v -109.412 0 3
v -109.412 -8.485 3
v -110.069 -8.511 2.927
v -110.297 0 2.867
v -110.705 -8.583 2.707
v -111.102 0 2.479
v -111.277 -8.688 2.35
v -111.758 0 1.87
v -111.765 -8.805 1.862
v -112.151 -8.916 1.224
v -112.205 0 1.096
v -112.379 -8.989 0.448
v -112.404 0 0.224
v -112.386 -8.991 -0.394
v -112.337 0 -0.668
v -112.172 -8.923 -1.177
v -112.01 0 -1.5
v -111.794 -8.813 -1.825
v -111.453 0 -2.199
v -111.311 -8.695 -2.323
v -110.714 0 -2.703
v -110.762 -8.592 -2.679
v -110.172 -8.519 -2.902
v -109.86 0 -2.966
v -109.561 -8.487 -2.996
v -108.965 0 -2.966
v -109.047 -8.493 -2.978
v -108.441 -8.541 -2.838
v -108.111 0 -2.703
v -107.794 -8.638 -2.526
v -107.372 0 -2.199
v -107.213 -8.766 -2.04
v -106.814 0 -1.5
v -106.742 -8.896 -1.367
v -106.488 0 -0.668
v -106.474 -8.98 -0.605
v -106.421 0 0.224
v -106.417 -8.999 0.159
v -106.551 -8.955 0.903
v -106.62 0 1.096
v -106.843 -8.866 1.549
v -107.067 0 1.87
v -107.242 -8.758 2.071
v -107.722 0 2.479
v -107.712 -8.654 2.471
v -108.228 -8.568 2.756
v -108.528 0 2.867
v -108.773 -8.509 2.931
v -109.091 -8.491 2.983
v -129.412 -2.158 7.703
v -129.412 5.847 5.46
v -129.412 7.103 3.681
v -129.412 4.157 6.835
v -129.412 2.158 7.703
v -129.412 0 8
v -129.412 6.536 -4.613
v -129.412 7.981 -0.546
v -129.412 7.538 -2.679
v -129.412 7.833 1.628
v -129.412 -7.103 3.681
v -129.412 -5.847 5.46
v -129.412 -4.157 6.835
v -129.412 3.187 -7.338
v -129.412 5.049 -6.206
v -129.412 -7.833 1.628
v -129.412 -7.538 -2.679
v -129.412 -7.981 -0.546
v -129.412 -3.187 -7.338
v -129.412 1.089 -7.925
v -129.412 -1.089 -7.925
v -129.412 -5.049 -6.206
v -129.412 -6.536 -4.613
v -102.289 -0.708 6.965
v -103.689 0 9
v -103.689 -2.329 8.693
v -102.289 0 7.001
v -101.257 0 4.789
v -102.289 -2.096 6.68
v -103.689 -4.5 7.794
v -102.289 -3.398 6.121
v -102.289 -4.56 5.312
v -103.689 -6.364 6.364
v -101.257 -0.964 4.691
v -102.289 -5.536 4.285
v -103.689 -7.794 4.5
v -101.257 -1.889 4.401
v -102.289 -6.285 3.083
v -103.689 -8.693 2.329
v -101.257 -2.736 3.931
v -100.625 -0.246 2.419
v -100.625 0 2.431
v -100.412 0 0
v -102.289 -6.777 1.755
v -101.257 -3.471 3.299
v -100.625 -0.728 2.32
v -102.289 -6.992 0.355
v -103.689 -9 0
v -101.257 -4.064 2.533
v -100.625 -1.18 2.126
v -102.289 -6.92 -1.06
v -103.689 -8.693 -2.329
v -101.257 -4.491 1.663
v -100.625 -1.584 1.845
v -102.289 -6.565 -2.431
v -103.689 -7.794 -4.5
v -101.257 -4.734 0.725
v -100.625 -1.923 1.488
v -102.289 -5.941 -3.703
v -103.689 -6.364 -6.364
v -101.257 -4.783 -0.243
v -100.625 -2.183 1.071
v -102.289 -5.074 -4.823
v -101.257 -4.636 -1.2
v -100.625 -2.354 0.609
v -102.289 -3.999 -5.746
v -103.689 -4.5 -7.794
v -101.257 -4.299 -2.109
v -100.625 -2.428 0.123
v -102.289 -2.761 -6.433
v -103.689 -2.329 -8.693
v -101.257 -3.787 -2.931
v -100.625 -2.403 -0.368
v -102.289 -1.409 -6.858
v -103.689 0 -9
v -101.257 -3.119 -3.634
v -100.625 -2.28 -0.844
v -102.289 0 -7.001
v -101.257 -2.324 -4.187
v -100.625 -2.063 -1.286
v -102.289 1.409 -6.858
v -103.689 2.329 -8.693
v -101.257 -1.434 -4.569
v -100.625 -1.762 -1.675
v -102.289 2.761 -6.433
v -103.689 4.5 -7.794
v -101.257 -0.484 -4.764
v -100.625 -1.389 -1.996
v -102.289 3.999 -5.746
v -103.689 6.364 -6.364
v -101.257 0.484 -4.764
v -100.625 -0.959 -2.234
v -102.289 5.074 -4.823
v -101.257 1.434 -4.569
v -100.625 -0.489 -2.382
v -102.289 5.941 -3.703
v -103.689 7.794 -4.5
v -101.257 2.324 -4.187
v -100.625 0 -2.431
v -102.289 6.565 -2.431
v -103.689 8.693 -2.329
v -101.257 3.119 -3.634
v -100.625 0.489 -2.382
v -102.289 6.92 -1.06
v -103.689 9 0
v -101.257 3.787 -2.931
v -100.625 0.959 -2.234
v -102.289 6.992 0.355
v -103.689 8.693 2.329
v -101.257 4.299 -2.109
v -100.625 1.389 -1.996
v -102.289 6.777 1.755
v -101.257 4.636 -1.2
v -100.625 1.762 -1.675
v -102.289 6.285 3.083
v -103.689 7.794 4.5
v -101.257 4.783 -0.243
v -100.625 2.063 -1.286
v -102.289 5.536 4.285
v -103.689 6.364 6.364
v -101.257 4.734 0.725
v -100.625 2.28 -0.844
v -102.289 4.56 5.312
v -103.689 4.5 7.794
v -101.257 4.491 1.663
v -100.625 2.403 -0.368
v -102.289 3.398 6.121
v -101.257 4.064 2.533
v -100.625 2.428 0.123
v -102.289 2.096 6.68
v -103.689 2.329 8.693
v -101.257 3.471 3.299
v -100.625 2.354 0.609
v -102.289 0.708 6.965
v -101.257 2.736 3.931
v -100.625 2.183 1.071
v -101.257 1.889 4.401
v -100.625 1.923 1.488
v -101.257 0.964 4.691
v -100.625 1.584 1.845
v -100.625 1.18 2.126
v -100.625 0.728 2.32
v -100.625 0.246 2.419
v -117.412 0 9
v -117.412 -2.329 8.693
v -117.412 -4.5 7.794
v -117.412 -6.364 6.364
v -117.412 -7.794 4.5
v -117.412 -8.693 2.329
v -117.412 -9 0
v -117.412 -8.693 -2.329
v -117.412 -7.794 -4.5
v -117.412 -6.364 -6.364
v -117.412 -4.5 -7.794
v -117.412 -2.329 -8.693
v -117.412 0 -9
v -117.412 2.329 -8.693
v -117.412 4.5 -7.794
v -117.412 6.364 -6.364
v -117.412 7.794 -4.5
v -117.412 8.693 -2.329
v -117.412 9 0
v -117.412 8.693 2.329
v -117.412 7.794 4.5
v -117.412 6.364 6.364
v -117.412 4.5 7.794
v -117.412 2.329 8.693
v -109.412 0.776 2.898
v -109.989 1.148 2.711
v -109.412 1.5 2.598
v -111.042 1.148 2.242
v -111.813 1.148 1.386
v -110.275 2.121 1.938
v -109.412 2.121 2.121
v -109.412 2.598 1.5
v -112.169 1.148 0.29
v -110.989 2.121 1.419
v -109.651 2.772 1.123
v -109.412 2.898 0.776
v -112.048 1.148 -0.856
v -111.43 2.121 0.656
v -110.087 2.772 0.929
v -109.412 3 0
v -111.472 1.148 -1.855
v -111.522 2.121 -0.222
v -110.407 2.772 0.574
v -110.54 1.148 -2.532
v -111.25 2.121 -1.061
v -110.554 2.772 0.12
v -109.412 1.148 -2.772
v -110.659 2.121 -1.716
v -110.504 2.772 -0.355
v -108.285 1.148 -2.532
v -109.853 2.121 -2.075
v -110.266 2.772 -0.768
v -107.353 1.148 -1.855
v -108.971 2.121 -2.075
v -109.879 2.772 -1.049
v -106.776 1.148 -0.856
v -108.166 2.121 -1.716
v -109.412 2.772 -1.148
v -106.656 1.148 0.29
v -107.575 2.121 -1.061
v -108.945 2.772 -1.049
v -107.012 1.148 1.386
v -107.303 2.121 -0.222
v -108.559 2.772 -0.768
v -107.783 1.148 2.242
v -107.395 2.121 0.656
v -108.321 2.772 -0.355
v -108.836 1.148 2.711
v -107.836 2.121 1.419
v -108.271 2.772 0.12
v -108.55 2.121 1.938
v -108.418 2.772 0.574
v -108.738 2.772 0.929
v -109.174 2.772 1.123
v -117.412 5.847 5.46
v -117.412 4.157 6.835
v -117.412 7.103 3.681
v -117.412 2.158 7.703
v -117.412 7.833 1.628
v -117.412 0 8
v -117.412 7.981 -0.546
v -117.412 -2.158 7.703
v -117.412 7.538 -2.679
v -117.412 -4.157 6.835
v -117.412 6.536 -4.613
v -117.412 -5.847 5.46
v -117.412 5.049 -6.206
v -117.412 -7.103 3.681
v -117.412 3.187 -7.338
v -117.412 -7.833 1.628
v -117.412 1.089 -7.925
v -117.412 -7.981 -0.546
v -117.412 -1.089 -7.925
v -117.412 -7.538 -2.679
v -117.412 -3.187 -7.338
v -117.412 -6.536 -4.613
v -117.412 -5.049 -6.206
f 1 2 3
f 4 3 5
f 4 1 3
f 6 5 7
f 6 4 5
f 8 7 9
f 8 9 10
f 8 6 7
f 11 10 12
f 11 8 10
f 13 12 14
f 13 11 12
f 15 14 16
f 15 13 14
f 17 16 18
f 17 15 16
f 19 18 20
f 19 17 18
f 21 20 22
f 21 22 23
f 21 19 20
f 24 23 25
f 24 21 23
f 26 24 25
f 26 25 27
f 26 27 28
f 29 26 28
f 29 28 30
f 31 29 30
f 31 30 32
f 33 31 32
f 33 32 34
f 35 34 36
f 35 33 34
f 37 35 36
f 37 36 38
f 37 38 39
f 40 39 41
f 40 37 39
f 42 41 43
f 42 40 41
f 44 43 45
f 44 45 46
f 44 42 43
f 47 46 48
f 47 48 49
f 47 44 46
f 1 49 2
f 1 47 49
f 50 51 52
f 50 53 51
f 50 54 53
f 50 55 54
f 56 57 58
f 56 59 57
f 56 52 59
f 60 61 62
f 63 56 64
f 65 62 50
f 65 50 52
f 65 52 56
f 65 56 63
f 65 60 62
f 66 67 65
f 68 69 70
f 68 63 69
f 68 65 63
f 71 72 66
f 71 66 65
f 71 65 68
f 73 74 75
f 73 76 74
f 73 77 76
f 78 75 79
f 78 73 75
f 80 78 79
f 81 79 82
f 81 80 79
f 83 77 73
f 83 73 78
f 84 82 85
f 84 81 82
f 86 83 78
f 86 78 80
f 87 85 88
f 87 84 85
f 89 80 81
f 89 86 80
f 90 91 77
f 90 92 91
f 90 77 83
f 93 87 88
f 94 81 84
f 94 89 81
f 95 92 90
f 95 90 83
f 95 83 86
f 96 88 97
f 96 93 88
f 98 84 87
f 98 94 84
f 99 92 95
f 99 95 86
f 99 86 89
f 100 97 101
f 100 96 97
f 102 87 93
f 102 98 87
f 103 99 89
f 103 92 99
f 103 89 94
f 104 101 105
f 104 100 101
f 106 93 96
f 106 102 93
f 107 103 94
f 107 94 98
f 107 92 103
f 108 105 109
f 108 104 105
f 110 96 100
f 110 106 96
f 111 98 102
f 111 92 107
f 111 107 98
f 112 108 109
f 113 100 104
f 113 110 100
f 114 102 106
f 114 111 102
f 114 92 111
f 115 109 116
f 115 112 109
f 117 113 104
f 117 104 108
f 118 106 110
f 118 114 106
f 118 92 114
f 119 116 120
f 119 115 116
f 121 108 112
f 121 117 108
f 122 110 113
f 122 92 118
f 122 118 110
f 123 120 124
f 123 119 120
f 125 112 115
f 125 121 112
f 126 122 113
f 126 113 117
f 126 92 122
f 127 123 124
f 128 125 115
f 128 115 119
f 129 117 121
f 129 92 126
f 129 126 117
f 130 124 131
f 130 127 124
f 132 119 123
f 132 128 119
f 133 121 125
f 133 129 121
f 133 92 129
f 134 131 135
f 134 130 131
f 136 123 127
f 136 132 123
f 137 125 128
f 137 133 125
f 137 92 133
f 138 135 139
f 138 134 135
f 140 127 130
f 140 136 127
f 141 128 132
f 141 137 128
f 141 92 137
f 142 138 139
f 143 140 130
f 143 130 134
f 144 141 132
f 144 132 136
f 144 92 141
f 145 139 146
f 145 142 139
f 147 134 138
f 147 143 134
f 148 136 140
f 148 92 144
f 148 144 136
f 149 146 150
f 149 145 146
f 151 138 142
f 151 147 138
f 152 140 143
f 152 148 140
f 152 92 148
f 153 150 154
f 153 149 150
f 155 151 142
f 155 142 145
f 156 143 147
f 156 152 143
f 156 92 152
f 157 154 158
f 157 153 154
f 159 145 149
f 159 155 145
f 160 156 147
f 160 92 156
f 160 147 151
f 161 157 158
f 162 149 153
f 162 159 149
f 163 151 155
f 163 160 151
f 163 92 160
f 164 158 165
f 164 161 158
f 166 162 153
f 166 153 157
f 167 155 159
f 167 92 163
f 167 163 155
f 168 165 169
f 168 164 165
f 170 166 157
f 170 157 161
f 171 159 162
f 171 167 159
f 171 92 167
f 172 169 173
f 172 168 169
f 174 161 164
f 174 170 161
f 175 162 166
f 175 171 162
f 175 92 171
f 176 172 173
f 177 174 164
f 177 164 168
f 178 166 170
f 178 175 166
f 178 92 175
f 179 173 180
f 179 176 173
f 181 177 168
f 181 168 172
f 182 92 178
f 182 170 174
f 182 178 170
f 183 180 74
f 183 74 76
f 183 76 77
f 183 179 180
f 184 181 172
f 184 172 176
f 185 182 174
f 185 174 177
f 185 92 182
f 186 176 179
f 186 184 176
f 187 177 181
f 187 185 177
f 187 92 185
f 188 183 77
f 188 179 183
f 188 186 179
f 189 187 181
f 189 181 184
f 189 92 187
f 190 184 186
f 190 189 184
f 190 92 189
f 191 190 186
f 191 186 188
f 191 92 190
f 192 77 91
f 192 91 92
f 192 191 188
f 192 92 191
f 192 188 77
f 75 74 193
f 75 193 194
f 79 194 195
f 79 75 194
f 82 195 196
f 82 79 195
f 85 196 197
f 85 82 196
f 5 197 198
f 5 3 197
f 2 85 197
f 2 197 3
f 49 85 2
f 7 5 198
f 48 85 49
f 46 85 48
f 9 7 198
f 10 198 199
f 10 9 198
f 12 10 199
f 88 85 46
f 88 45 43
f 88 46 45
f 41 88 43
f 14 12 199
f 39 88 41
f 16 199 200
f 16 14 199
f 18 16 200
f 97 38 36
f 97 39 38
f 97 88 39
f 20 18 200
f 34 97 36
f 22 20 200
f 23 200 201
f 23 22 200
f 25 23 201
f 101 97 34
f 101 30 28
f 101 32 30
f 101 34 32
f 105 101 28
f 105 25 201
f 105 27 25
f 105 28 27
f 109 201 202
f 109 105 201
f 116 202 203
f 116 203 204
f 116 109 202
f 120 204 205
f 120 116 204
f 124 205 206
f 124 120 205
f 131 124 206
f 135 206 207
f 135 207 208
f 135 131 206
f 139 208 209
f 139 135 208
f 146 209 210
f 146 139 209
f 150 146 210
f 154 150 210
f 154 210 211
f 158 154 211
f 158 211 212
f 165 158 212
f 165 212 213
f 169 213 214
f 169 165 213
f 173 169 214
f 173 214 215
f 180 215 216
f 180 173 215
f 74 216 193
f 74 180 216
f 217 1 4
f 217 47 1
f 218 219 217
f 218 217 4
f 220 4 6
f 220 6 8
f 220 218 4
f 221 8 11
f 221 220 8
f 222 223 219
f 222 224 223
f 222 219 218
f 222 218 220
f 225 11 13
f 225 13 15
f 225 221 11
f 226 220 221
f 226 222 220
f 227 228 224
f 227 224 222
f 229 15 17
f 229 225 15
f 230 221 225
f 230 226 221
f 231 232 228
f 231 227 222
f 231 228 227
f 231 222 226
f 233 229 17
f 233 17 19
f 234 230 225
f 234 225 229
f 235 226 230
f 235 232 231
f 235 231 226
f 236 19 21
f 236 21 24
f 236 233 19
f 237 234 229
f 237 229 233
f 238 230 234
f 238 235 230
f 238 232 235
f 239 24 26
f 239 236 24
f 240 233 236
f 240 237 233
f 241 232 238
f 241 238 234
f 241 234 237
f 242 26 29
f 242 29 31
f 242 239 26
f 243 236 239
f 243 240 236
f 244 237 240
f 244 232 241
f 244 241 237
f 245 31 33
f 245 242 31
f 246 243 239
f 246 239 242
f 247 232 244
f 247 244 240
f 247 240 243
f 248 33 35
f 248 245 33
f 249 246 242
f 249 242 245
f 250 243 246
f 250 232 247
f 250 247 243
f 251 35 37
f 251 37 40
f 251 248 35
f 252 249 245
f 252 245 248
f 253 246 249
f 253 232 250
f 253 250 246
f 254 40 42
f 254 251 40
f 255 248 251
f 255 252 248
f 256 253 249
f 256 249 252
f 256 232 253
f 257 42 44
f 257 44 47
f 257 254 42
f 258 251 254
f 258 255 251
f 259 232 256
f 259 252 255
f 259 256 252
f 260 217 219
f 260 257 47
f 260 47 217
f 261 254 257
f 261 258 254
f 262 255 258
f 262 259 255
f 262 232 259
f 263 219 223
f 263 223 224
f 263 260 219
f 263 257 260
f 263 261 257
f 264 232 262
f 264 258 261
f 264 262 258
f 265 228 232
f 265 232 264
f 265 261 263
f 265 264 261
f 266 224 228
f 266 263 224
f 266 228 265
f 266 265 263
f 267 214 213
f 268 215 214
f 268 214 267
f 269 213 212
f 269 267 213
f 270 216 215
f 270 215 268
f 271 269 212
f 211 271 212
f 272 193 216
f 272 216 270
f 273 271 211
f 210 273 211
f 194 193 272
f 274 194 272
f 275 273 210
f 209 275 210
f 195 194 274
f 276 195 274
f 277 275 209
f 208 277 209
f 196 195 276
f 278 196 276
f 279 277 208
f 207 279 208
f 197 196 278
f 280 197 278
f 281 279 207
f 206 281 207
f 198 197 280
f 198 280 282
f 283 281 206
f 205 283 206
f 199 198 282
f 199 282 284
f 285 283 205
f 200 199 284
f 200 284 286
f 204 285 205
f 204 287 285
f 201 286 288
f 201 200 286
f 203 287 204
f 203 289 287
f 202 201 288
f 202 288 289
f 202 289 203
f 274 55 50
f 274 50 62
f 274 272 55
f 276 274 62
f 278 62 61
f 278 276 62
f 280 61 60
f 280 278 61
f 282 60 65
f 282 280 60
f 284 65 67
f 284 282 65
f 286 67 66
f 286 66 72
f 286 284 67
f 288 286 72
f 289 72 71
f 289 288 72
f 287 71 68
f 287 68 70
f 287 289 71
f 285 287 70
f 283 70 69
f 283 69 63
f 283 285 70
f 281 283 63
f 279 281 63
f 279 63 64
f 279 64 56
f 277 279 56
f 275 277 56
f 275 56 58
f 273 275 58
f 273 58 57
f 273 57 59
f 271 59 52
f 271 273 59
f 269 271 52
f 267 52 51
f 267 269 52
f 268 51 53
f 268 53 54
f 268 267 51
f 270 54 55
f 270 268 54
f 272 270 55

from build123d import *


with BuildPart() as part:
    # Esquisse1 → Révolution1 (revolve)
    with BuildSketch(Plane.XY, mode=Mode.PRIVATE) as r_volution1_sk:
        with BuildLine():
            Line((-117.412392243, 9), (-103.688586948, 9))
            ThreePointArc((-103.688586948, 9), (-101.256912887, 4.78887909), (-100.412392243, 0))
            Line((-100.412392243, 0), (-129.412392243, 0))
            Line((-129.412392243, 0), (-129.412392243, 8))
            Line((-129.412392243, 8), (-117.412392243, 8))
            Line((-117.412392243, 8), (-117.412392243, 9))
        make_face()
    revolve(r_volution1_sk.sketch.rotate(Axis((-129.412392243, 0, 0), (1, 0, 0)), 90), axis=Axis((-129.412392243, 0, 0), (1, 0, 0)))  # turned: the seam where the file's is

    # Esquisse2 → Enlèvement de matière-Révolution1 (revolve, cut)
    with BuildSketch(Plane.XY, mode=Mode.PRIVATE) as enl_vement_de_mati_re_r_volution1_sk:
        with BuildLine():
            Line((-109.412392243, -10.843650203), (-106.412392243, -10.843650203))
            Line((-106.412392243, -10.843650203), (-106.412392243, 0))
            ThreePointArc((-106.412392243, 0), (-107.291071899, 2.121320344), (-109.412392243, 3))
            Line((-109.412392243, 3), (-109.412392243, 0))
            Line((-109.412392243, 0), (-109.412392243, -10.843650203))
        make_face()
    revolve(enl_vement_de_mati_re_r_volution1_sk.sketch.rotate(Axis((-109.412392243, 10.689425153, 0), (0, -1, 0)), 90), axis=Axis((-109.412392243, 10.689425153, 0), (0, -1, 0)), mode=Mode.SUBTRACT)  # turned: the seam where the file's is


solid = part.part
